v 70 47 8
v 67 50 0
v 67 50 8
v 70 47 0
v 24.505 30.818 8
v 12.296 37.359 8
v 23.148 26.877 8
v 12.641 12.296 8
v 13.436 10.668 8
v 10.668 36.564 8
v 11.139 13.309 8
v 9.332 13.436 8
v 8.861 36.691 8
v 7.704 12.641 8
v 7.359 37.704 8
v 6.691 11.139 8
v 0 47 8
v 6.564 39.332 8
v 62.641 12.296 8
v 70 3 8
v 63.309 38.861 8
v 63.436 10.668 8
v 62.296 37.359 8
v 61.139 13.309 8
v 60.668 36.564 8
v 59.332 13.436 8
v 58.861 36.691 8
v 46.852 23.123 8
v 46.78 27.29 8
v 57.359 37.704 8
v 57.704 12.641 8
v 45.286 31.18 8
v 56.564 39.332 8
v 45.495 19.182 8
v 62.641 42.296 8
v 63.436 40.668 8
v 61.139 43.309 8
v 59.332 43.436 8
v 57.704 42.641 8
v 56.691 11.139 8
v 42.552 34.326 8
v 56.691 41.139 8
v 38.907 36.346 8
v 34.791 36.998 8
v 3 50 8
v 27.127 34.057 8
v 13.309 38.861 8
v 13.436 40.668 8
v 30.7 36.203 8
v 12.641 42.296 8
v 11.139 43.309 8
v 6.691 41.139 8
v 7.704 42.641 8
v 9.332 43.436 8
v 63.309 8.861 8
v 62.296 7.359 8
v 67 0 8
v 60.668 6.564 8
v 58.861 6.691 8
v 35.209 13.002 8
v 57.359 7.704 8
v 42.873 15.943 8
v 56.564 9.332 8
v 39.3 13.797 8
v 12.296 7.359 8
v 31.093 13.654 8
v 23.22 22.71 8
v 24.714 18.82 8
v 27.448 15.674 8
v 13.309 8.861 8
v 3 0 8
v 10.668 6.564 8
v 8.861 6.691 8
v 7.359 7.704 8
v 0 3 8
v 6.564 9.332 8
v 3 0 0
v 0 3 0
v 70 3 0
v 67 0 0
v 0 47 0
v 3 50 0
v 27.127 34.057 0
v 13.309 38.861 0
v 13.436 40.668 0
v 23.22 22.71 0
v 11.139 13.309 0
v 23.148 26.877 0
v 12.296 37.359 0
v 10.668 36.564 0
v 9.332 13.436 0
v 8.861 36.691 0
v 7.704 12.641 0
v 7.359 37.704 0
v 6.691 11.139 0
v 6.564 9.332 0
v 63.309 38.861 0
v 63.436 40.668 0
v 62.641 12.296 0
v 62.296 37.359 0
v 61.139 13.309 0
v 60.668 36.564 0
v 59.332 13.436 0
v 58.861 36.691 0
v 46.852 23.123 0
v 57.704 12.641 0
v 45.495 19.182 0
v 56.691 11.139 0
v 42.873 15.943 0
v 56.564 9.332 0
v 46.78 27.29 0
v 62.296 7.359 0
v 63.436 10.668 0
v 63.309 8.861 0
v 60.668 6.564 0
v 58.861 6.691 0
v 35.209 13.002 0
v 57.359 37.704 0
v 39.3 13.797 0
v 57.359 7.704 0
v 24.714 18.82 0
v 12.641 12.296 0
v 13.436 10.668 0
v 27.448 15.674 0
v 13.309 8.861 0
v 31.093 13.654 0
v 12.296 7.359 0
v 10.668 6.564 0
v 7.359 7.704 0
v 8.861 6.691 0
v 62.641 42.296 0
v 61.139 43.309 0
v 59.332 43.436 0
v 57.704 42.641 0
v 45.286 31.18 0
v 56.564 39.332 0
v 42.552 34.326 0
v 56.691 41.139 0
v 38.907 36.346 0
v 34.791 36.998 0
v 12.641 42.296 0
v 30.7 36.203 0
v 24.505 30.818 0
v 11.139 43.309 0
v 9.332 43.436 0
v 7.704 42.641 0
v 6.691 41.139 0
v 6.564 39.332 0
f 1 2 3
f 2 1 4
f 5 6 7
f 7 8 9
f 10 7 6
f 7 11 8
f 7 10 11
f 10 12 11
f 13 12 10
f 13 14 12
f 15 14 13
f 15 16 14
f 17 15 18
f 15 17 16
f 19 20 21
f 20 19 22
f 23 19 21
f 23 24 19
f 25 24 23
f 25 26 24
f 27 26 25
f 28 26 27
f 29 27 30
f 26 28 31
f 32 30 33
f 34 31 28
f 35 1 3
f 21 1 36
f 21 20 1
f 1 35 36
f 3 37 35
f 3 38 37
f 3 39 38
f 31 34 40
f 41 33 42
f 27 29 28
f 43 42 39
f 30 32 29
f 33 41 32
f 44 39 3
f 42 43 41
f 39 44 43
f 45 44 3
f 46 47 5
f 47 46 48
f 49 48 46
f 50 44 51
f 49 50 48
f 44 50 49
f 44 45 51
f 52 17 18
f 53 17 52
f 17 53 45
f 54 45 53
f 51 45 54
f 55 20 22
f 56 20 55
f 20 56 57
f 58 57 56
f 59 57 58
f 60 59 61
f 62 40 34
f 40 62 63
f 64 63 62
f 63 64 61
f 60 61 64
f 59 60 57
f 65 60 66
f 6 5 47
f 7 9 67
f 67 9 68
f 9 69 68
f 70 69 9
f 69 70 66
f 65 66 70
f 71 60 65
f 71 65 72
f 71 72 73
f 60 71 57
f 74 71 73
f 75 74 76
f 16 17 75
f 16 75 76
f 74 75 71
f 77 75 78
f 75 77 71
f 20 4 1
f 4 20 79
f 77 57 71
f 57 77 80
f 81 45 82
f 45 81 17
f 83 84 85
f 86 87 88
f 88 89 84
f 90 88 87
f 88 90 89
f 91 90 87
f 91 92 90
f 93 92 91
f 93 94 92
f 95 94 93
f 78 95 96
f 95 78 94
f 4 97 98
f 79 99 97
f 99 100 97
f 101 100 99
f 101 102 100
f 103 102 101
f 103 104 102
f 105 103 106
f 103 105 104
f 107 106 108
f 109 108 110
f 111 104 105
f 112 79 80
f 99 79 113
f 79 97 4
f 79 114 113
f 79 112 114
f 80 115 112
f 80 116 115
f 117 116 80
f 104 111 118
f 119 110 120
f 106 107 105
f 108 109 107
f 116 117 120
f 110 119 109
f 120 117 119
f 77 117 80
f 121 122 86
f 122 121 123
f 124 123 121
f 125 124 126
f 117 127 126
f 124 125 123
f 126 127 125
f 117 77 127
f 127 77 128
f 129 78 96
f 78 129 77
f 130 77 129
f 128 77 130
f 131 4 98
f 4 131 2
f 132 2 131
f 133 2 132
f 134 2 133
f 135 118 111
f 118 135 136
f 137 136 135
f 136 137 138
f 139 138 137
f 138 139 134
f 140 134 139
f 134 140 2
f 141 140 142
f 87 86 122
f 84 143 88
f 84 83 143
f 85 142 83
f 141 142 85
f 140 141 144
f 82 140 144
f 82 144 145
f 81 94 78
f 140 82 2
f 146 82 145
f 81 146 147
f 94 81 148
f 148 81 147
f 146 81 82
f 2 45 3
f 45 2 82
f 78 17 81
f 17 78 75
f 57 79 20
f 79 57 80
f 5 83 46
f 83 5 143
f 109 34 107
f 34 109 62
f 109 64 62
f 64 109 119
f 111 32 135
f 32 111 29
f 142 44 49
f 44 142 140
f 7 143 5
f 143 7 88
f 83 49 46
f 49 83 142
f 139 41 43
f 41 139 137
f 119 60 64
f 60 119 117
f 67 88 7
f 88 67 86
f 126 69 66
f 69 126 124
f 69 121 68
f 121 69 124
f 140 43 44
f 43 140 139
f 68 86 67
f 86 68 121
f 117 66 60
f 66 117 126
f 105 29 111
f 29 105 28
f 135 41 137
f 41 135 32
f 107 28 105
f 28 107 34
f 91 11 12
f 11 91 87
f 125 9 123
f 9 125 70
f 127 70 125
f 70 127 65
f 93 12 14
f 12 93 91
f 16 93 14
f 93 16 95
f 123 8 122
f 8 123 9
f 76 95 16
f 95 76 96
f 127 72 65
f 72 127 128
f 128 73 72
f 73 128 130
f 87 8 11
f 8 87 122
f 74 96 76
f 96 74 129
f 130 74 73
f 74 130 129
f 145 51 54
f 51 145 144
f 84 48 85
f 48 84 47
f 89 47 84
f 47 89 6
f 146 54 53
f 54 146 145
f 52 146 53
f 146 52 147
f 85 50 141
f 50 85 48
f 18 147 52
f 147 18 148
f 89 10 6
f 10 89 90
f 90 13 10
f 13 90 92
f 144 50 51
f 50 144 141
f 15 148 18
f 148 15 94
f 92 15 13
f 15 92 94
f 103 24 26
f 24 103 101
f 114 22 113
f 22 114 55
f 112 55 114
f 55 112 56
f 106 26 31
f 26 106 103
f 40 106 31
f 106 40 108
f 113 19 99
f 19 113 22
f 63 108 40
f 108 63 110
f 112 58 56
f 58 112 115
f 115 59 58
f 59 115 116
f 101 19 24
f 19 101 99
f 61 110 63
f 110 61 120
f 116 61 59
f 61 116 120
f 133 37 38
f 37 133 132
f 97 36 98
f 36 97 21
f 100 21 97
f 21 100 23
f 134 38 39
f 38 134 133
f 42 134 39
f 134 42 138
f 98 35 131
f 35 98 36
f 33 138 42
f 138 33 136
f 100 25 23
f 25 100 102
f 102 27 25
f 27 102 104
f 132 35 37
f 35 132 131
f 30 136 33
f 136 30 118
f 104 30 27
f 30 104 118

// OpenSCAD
$fn = 32;

// ----------------------------------------------------------------------
// Spacer plate: rect 70 x 50
// ----------------------------------------------------------------------

// --- parameters (mm) ---
bore_r = 12;              // centre bore radius
bolt_r = 3.5;             // bolt hole radius
plate_t = 8;              // plate thickness, Z (extrusion height)
plate_l = 70;             // plate length, X
plate_w = 50;             // plate width, Y
inset = 10;               // corner hole inset

profile = [[3, 0], [67, 0], [70, 3], [70, 47], [67, 50], [3, 50], [0, 47], [0, 3]];  // primary outline, 8 points, counter clockwise
void_1 = [[46.78, 27.29], [45.286, 31.18], [42.552, 34.326], [38.907, 36.346], [34.791, 36.998], [30.7, 36.203], [27.127, 34.057], [24.505, 30.818], [23.148, 26.877], [23.22, 22.71], [24.714, 18.82], [27.448, 15.674], [31.093, 13.654], [35.209, 13.002], [39.3, 13.797], [42.873, 15.943], [45.495, 19.182], [46.852, 23.123]];  // centre bore, 18 points
void_2 = [[13.436, 10.668], [12.641, 12.296], [11.139, 13.309], [9.332, 13.436], [7.704, 12.641], [6.691, 11.139], [6.564, 9.332], [7.359, 7.704], [8.861, 6.691], [10.668, 6.564], [12.296, 7.359], [13.309, 8.861]];  // corner hole, 12 points
void_3 = [[13.436, 40.668], [12.641, 42.296], [11.139, 43.309], [9.332, 43.436], [7.704, 42.641], [6.691, 41.139], [6.564, 39.332], [7.359, 37.704], [8.861, 36.691], [10.668, 36.564], [12.296, 37.359], [13.309, 38.861]];  // corner hole, 12 points
void_4 = [[63.436, 10.668], [62.641, 12.296], [61.139, 13.309], [59.332, 13.436], [57.704, 12.641], [56.691, 11.139], [56.564, 9.332], [57.359, 7.704], [58.861, 6.691], [60.668, 6.564], [62.296, 7.359], [63.309, 8.861]];  // corner hole, 12 points
void_5 = [[63.436, 40.668], [62.641, 42.296], [61.139, 43.309], [59.332, 43.436], [57.704, 42.641], [56.691, 41.139], [56.564, 39.332], [57.359, 37.704], [58.861, 36.691], [60.668, 36.564], [62.296, 37.359], [63.309, 38.861]];  // corner hole, 12 points

// --- the one profile operation ---
difference() {
  linear_extrude(height = plate_t) polygon(points = profile);
  translate([0, 0, -1])
    linear_extrude(height = plate_t + 2) polygon(points = void_1);
  translate([0, 0, -1])
    linear_extrude(height = plate_t + 2) polygon(points = void_2);
  translate([0, 0, -1])
    linear_extrude(height = plate_t + 2) polygon(points = void_3);
  translate([0, 0, -1])
    linear_extrude(height = plate_t + 2) polygon(points = void_4);
  translate([0, 0, -1])
    linear_extrude(height = plate_t + 2) polygon(points = void_5);
}
